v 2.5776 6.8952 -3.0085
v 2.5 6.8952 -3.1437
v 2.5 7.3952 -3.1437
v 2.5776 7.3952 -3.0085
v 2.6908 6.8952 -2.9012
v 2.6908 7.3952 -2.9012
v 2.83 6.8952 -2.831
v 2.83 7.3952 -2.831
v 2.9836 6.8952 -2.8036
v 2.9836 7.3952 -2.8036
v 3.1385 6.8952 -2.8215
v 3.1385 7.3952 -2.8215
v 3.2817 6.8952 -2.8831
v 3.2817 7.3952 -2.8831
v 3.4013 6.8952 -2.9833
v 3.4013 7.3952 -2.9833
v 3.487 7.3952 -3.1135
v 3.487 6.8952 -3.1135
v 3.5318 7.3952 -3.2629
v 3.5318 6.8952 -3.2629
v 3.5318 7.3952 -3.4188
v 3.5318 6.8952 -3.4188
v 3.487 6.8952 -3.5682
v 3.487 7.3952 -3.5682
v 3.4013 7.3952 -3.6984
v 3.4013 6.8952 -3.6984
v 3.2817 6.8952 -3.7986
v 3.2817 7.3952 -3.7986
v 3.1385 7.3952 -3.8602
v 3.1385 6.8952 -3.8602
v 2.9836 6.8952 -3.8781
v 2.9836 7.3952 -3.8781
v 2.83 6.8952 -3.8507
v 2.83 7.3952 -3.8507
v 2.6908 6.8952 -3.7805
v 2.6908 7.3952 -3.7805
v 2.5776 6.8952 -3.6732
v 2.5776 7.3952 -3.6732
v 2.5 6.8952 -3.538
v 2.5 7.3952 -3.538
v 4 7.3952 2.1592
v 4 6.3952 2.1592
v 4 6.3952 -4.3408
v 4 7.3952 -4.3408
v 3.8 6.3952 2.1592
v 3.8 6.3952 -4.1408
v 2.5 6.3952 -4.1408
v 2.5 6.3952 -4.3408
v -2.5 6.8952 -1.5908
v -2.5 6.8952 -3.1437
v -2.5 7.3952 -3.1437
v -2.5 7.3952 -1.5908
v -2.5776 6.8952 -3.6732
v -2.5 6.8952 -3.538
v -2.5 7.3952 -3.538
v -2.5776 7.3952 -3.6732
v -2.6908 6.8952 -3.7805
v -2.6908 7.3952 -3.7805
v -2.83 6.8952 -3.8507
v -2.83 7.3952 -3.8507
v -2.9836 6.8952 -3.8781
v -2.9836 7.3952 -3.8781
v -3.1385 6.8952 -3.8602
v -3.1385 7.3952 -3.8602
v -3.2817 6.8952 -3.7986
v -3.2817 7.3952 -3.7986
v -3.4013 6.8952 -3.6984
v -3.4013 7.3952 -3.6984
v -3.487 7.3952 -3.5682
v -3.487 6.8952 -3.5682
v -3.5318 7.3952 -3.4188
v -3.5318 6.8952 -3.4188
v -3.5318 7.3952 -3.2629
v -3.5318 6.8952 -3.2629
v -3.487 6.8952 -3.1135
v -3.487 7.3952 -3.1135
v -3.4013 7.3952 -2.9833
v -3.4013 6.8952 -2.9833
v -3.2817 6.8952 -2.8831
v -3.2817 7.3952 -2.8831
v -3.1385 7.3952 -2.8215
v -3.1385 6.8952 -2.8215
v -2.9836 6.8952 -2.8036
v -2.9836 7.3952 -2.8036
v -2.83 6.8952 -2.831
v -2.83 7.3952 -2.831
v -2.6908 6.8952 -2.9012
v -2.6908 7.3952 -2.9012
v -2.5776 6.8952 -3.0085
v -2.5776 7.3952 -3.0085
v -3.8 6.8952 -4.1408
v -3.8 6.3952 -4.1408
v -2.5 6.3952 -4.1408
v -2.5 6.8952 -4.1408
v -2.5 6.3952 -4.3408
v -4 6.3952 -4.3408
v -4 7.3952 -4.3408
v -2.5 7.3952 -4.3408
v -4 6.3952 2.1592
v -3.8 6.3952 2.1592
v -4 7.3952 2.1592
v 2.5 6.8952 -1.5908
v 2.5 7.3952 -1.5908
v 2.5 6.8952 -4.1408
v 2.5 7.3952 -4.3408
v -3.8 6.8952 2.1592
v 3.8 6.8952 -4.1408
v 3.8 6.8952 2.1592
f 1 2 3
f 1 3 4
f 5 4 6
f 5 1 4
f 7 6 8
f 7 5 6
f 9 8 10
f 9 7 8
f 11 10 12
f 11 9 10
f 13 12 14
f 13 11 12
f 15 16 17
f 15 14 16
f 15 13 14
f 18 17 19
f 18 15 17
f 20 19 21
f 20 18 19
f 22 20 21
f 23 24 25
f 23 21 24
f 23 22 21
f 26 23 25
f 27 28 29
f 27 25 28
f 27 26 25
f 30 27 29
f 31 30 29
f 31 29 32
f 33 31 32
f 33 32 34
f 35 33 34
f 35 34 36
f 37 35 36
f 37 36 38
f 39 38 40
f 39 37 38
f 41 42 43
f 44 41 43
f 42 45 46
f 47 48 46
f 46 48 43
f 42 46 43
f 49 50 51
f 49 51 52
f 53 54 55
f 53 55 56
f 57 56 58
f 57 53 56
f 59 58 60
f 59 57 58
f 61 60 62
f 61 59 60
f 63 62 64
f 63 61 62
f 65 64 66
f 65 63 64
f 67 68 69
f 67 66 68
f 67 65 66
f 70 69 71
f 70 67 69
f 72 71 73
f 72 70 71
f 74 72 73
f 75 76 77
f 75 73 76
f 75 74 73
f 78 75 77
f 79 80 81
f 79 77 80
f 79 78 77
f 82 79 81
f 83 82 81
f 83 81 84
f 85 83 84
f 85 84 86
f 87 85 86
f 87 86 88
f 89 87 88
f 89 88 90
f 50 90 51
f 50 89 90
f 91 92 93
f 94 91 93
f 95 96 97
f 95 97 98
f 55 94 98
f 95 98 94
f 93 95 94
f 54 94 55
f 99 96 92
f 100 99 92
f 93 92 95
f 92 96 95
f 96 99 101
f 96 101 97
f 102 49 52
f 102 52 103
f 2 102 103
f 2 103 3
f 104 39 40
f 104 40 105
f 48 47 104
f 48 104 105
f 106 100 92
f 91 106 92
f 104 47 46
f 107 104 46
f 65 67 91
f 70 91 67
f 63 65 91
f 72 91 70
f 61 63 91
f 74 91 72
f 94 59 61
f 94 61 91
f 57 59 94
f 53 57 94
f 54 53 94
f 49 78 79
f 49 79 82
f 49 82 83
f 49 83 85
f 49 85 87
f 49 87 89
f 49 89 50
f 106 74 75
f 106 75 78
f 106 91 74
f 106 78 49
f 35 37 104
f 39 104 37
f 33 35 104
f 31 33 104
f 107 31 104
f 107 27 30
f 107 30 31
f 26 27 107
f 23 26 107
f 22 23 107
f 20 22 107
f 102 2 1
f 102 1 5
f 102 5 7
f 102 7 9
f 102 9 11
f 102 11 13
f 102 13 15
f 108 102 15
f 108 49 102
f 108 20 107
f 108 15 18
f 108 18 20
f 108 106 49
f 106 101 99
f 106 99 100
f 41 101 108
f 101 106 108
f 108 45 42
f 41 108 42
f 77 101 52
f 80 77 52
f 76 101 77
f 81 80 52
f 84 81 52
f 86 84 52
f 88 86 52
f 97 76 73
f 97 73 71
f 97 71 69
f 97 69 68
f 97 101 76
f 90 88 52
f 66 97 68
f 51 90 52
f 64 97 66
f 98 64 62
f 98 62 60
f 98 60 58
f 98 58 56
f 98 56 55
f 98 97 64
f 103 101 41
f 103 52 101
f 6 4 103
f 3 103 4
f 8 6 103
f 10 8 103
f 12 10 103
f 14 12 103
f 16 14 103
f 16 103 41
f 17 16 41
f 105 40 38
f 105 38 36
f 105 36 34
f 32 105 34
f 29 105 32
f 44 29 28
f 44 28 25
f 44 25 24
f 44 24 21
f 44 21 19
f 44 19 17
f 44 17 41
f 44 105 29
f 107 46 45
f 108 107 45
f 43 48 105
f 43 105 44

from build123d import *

# Parameters (mm, degrees)
SKETCH1_W           = 80
SKETCH1_H           = 80
BOSS_EXTRUDE2_DEPTH = 10
CUT_EXTRUDE2_DEPTH  = 14
CUT_EXTRUDE3_DEPTH  = 14
CUT_EXTRUDE4_DEPTH  = 5
SCALE2_SCALE        = 0.1


with BuildPart() as part:
    # Sketch1 → Boss-Extrude2 (new body)
    with BuildSketch(Plane(origin=(0, 0, 0), x_dir=(1, 0, 0), z_dir=(0, 1, 0))):
        Rectangle(SKETCH1_W, SKETCH1_H)
    extrude(amount=BOSS_EXTRUDE2_DEPTH)

    # Sketch1<8> → Cut-Extrude2 (cut)
    with BuildSketch(Plane(origin=(0, 0, 0), x_dir=(1, 0, 0), z_dir=(0, 1, 0))):
        with BuildLine():
            Line((25, 40), (-25, 40))
            Line((-25, 40), (-25, 31.971455811))
            ThreePointArc((-25, 31.971455811), (-35.374629105, 30), (-25, 28.028544189))
            Line((-25, 28.028544189), (-25, 12.5))
            Line((-25, 12.5), (25, 12.5))
            Line((25, 12.5), (25, 28.028544189))
            ThreePointArc((25, 28.028544189), (35.374629105, 30), (25, 31.971455811))
            Line((25, 31.971455811), (25, 40))
        make_face()
    extrude(amount=CUT_EXTRUDE2_DEPTH, mode=Mode.SUBTRACT)

    # Sketch4 → Cut-Extrude3 (cut)
    with BuildSketch(Plane.XZ):
        Polygon((40, 40), (-40, 40), (-40, 25), (-38, 25), (38, 25), (40, 25), align=None)
    extrude(amount=-CUT_EXTRUDE3_DEPTH, mode=Mode.SUBTRACT)

    # Sketch4<4> → Cut-Extrude4 (cut)
    with BuildSketch(Plane.XZ):
        with BuildLine():
            Line((38, 25), (-38, 25))
            Line((-38, 25), (-38, -38))
            Line((-38, -38), (-27, -38))
            Line((-27, -38), (-25, -38))
            Line((-25, -38), (-25, -31.971455811))
            ThreePointArc((-25, -31.971455811), (-35.374629105, -30), (-25, -28.028544189))
            Line((-25, -28.028544189), (-25, -12.5))
            Line((-25, -12.5), (25, -12.5))
            Line((25, -12.5), (25, -28.028544189))
            ThreePointArc((25, -28.028544189), (35.374629105, -30), (25, -31.971455811))
            Line((25, -31.971455811), (25, -38))
            Line((25, -38), (27, -38))
            Line((27, -38), (38, -38))
            Line((38, -38), (38, 25))
        make_face()
    extrude(amount=-CUT_EXTRUDE4_DEPTH, mode=Mode.SUBTRACT)


with BuildPart() as part_1:
    # Scale2: scaled about (0, 7.105810112, -0.378714582)
    add(part.part.scale(SCALE2_SCALE).moved(Location((0, 6.395229101, -0.340843124))))


solid = part_1.part
